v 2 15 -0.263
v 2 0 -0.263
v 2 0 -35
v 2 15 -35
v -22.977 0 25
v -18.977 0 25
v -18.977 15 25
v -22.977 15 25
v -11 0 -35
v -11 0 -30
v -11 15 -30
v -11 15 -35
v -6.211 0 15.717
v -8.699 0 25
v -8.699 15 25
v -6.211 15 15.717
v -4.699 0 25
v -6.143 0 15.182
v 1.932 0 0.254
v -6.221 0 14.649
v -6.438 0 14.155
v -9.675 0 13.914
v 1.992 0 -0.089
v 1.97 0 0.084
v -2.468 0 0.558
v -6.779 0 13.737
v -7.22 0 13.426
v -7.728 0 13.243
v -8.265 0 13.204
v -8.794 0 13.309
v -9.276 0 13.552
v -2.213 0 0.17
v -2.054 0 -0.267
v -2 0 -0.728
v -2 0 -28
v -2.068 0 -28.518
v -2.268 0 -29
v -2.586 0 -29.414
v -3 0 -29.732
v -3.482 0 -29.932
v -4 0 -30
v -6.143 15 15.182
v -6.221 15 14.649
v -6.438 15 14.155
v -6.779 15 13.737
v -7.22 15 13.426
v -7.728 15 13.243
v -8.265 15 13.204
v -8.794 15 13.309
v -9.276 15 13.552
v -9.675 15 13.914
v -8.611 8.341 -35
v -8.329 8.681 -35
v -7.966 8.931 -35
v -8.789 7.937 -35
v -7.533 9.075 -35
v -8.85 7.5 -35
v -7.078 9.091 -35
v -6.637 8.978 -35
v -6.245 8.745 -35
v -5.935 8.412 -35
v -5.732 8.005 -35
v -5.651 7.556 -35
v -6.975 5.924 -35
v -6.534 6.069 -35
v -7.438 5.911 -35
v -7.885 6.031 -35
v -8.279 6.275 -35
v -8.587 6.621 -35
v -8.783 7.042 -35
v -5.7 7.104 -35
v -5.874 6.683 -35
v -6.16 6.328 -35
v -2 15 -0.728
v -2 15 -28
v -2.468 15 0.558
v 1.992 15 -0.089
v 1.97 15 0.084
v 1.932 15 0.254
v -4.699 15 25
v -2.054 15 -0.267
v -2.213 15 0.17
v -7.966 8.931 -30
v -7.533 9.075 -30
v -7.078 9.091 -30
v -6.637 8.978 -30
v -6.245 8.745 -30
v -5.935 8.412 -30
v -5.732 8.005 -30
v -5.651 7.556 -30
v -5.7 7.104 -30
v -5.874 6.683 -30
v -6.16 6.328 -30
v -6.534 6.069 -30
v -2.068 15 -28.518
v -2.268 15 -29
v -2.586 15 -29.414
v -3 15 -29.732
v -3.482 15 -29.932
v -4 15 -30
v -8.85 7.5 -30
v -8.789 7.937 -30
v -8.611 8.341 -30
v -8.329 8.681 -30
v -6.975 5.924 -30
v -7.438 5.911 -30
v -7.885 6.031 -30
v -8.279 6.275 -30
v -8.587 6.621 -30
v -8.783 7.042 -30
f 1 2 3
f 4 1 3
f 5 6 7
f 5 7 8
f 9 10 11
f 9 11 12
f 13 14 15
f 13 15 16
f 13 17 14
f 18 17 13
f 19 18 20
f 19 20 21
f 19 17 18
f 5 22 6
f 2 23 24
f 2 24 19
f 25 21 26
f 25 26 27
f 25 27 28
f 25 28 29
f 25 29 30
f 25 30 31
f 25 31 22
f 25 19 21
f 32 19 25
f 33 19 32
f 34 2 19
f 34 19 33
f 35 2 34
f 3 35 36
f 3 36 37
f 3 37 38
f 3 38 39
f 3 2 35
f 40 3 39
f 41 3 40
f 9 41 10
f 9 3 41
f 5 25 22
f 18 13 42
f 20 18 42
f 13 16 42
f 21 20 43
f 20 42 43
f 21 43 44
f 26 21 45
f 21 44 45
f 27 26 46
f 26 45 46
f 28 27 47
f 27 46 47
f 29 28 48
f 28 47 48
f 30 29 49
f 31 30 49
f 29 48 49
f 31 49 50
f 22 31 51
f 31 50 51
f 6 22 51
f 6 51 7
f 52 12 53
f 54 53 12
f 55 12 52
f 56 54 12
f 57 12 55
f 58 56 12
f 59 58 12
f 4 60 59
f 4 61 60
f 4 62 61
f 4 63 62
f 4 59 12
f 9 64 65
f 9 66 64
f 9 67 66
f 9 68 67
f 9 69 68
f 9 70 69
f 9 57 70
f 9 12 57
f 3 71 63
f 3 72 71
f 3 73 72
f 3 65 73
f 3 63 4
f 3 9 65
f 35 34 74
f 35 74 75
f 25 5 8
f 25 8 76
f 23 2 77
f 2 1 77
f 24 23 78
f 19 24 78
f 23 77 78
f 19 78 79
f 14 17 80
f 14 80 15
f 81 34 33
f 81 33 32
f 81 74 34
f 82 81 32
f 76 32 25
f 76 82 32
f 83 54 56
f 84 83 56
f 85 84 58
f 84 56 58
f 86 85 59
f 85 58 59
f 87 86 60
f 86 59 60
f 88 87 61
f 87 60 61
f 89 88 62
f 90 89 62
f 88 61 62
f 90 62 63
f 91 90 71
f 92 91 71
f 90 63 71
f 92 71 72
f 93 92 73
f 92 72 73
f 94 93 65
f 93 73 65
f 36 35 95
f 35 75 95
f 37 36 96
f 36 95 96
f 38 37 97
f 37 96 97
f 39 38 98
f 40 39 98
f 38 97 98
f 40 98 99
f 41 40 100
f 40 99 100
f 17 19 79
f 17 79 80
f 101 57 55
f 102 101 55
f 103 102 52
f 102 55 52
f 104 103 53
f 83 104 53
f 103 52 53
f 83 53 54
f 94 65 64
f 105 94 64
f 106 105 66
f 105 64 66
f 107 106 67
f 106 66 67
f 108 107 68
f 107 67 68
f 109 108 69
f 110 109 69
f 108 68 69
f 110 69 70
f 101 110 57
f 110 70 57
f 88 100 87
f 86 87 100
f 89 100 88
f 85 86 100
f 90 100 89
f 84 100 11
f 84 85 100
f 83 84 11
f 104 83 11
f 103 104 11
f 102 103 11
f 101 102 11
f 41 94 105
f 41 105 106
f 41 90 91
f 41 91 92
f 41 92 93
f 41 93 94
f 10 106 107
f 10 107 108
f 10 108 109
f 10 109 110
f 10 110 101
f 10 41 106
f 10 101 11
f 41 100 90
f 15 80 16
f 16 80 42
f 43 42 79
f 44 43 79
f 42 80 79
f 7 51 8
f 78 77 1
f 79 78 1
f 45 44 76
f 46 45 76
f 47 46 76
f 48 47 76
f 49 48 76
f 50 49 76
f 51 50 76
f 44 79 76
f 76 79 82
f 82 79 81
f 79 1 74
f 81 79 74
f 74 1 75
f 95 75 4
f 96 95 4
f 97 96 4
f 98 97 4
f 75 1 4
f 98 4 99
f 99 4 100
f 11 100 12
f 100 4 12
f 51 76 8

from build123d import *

# Parameters (mm, degrees)
BOSS_EXTRUDE1_DEPTH = 15
CUT_EXTRUDE2_DEPTH  = 10
FILLET2_R           = 2


with BuildPart() as part:
    # Sketch1 → Boss-Extrude1 (new body)
    with BuildSketch(Plane(origin=(0, 0, 0), x_dir=(1, 0, 0), z_dir=(0, 1, 0))):
        Polygon((-2, 0), (-2, 30), (-11, 30), (-11, 35), (2, 35), (2, 30), (2, 0), (-4.698729811, -25), (-8.698729811, -25), (-3.876557728, -7.003408785), (-18.977490779, -25), (-22.977490779, -25), align=None)
    extrude(amount=BOSS_EXTRUDE1_DEPTH)

    # Sketch3 → Cut-Extrude2 (cut)
    with BuildSketch(Plane(origin=(0, 0, -35), x_dir=(-1, 0, 0), z_dir=(0, 0, -1))):
        with BuildLine():
            ThreePointArc((8.85, 7.5), (8.611041293, 8.341169779), (7.965541753, 8.931083506))
            Line((7.965541753, 8.931083506), (6.534458247, 6.068916494))
            ThreePointArc((6.534458247, 6.068916494), (8.091169779, 6.138958707), (8.85, 7.5))
        make_face()
        with BuildLine():
            Line((6.534458247, 6.068916494), (7.965541753, 8.931083506))
            ThreePointArc((7.965541753, 8.931083506), (5.818916494, 8.215541753), (6.534458247, 6.068916494))
        make_face()
    extrude(amount=-CUT_EXTRUDE2_DEPTH, mode=Mode.SUBTRACT)

    # Fillet2
    fillet2_edges = [part.edges().sort_by_distance(p)[0] for p in [
        (-2, 7.5, 0),
        (-2, 7.5, -30),
        (2, 7.5, 0),
        (-3.876557728, 7.5, 7.003408785),
    ]]
    fillet(fillet2_edges, radius=FILLET2_R)


solid = part.part
